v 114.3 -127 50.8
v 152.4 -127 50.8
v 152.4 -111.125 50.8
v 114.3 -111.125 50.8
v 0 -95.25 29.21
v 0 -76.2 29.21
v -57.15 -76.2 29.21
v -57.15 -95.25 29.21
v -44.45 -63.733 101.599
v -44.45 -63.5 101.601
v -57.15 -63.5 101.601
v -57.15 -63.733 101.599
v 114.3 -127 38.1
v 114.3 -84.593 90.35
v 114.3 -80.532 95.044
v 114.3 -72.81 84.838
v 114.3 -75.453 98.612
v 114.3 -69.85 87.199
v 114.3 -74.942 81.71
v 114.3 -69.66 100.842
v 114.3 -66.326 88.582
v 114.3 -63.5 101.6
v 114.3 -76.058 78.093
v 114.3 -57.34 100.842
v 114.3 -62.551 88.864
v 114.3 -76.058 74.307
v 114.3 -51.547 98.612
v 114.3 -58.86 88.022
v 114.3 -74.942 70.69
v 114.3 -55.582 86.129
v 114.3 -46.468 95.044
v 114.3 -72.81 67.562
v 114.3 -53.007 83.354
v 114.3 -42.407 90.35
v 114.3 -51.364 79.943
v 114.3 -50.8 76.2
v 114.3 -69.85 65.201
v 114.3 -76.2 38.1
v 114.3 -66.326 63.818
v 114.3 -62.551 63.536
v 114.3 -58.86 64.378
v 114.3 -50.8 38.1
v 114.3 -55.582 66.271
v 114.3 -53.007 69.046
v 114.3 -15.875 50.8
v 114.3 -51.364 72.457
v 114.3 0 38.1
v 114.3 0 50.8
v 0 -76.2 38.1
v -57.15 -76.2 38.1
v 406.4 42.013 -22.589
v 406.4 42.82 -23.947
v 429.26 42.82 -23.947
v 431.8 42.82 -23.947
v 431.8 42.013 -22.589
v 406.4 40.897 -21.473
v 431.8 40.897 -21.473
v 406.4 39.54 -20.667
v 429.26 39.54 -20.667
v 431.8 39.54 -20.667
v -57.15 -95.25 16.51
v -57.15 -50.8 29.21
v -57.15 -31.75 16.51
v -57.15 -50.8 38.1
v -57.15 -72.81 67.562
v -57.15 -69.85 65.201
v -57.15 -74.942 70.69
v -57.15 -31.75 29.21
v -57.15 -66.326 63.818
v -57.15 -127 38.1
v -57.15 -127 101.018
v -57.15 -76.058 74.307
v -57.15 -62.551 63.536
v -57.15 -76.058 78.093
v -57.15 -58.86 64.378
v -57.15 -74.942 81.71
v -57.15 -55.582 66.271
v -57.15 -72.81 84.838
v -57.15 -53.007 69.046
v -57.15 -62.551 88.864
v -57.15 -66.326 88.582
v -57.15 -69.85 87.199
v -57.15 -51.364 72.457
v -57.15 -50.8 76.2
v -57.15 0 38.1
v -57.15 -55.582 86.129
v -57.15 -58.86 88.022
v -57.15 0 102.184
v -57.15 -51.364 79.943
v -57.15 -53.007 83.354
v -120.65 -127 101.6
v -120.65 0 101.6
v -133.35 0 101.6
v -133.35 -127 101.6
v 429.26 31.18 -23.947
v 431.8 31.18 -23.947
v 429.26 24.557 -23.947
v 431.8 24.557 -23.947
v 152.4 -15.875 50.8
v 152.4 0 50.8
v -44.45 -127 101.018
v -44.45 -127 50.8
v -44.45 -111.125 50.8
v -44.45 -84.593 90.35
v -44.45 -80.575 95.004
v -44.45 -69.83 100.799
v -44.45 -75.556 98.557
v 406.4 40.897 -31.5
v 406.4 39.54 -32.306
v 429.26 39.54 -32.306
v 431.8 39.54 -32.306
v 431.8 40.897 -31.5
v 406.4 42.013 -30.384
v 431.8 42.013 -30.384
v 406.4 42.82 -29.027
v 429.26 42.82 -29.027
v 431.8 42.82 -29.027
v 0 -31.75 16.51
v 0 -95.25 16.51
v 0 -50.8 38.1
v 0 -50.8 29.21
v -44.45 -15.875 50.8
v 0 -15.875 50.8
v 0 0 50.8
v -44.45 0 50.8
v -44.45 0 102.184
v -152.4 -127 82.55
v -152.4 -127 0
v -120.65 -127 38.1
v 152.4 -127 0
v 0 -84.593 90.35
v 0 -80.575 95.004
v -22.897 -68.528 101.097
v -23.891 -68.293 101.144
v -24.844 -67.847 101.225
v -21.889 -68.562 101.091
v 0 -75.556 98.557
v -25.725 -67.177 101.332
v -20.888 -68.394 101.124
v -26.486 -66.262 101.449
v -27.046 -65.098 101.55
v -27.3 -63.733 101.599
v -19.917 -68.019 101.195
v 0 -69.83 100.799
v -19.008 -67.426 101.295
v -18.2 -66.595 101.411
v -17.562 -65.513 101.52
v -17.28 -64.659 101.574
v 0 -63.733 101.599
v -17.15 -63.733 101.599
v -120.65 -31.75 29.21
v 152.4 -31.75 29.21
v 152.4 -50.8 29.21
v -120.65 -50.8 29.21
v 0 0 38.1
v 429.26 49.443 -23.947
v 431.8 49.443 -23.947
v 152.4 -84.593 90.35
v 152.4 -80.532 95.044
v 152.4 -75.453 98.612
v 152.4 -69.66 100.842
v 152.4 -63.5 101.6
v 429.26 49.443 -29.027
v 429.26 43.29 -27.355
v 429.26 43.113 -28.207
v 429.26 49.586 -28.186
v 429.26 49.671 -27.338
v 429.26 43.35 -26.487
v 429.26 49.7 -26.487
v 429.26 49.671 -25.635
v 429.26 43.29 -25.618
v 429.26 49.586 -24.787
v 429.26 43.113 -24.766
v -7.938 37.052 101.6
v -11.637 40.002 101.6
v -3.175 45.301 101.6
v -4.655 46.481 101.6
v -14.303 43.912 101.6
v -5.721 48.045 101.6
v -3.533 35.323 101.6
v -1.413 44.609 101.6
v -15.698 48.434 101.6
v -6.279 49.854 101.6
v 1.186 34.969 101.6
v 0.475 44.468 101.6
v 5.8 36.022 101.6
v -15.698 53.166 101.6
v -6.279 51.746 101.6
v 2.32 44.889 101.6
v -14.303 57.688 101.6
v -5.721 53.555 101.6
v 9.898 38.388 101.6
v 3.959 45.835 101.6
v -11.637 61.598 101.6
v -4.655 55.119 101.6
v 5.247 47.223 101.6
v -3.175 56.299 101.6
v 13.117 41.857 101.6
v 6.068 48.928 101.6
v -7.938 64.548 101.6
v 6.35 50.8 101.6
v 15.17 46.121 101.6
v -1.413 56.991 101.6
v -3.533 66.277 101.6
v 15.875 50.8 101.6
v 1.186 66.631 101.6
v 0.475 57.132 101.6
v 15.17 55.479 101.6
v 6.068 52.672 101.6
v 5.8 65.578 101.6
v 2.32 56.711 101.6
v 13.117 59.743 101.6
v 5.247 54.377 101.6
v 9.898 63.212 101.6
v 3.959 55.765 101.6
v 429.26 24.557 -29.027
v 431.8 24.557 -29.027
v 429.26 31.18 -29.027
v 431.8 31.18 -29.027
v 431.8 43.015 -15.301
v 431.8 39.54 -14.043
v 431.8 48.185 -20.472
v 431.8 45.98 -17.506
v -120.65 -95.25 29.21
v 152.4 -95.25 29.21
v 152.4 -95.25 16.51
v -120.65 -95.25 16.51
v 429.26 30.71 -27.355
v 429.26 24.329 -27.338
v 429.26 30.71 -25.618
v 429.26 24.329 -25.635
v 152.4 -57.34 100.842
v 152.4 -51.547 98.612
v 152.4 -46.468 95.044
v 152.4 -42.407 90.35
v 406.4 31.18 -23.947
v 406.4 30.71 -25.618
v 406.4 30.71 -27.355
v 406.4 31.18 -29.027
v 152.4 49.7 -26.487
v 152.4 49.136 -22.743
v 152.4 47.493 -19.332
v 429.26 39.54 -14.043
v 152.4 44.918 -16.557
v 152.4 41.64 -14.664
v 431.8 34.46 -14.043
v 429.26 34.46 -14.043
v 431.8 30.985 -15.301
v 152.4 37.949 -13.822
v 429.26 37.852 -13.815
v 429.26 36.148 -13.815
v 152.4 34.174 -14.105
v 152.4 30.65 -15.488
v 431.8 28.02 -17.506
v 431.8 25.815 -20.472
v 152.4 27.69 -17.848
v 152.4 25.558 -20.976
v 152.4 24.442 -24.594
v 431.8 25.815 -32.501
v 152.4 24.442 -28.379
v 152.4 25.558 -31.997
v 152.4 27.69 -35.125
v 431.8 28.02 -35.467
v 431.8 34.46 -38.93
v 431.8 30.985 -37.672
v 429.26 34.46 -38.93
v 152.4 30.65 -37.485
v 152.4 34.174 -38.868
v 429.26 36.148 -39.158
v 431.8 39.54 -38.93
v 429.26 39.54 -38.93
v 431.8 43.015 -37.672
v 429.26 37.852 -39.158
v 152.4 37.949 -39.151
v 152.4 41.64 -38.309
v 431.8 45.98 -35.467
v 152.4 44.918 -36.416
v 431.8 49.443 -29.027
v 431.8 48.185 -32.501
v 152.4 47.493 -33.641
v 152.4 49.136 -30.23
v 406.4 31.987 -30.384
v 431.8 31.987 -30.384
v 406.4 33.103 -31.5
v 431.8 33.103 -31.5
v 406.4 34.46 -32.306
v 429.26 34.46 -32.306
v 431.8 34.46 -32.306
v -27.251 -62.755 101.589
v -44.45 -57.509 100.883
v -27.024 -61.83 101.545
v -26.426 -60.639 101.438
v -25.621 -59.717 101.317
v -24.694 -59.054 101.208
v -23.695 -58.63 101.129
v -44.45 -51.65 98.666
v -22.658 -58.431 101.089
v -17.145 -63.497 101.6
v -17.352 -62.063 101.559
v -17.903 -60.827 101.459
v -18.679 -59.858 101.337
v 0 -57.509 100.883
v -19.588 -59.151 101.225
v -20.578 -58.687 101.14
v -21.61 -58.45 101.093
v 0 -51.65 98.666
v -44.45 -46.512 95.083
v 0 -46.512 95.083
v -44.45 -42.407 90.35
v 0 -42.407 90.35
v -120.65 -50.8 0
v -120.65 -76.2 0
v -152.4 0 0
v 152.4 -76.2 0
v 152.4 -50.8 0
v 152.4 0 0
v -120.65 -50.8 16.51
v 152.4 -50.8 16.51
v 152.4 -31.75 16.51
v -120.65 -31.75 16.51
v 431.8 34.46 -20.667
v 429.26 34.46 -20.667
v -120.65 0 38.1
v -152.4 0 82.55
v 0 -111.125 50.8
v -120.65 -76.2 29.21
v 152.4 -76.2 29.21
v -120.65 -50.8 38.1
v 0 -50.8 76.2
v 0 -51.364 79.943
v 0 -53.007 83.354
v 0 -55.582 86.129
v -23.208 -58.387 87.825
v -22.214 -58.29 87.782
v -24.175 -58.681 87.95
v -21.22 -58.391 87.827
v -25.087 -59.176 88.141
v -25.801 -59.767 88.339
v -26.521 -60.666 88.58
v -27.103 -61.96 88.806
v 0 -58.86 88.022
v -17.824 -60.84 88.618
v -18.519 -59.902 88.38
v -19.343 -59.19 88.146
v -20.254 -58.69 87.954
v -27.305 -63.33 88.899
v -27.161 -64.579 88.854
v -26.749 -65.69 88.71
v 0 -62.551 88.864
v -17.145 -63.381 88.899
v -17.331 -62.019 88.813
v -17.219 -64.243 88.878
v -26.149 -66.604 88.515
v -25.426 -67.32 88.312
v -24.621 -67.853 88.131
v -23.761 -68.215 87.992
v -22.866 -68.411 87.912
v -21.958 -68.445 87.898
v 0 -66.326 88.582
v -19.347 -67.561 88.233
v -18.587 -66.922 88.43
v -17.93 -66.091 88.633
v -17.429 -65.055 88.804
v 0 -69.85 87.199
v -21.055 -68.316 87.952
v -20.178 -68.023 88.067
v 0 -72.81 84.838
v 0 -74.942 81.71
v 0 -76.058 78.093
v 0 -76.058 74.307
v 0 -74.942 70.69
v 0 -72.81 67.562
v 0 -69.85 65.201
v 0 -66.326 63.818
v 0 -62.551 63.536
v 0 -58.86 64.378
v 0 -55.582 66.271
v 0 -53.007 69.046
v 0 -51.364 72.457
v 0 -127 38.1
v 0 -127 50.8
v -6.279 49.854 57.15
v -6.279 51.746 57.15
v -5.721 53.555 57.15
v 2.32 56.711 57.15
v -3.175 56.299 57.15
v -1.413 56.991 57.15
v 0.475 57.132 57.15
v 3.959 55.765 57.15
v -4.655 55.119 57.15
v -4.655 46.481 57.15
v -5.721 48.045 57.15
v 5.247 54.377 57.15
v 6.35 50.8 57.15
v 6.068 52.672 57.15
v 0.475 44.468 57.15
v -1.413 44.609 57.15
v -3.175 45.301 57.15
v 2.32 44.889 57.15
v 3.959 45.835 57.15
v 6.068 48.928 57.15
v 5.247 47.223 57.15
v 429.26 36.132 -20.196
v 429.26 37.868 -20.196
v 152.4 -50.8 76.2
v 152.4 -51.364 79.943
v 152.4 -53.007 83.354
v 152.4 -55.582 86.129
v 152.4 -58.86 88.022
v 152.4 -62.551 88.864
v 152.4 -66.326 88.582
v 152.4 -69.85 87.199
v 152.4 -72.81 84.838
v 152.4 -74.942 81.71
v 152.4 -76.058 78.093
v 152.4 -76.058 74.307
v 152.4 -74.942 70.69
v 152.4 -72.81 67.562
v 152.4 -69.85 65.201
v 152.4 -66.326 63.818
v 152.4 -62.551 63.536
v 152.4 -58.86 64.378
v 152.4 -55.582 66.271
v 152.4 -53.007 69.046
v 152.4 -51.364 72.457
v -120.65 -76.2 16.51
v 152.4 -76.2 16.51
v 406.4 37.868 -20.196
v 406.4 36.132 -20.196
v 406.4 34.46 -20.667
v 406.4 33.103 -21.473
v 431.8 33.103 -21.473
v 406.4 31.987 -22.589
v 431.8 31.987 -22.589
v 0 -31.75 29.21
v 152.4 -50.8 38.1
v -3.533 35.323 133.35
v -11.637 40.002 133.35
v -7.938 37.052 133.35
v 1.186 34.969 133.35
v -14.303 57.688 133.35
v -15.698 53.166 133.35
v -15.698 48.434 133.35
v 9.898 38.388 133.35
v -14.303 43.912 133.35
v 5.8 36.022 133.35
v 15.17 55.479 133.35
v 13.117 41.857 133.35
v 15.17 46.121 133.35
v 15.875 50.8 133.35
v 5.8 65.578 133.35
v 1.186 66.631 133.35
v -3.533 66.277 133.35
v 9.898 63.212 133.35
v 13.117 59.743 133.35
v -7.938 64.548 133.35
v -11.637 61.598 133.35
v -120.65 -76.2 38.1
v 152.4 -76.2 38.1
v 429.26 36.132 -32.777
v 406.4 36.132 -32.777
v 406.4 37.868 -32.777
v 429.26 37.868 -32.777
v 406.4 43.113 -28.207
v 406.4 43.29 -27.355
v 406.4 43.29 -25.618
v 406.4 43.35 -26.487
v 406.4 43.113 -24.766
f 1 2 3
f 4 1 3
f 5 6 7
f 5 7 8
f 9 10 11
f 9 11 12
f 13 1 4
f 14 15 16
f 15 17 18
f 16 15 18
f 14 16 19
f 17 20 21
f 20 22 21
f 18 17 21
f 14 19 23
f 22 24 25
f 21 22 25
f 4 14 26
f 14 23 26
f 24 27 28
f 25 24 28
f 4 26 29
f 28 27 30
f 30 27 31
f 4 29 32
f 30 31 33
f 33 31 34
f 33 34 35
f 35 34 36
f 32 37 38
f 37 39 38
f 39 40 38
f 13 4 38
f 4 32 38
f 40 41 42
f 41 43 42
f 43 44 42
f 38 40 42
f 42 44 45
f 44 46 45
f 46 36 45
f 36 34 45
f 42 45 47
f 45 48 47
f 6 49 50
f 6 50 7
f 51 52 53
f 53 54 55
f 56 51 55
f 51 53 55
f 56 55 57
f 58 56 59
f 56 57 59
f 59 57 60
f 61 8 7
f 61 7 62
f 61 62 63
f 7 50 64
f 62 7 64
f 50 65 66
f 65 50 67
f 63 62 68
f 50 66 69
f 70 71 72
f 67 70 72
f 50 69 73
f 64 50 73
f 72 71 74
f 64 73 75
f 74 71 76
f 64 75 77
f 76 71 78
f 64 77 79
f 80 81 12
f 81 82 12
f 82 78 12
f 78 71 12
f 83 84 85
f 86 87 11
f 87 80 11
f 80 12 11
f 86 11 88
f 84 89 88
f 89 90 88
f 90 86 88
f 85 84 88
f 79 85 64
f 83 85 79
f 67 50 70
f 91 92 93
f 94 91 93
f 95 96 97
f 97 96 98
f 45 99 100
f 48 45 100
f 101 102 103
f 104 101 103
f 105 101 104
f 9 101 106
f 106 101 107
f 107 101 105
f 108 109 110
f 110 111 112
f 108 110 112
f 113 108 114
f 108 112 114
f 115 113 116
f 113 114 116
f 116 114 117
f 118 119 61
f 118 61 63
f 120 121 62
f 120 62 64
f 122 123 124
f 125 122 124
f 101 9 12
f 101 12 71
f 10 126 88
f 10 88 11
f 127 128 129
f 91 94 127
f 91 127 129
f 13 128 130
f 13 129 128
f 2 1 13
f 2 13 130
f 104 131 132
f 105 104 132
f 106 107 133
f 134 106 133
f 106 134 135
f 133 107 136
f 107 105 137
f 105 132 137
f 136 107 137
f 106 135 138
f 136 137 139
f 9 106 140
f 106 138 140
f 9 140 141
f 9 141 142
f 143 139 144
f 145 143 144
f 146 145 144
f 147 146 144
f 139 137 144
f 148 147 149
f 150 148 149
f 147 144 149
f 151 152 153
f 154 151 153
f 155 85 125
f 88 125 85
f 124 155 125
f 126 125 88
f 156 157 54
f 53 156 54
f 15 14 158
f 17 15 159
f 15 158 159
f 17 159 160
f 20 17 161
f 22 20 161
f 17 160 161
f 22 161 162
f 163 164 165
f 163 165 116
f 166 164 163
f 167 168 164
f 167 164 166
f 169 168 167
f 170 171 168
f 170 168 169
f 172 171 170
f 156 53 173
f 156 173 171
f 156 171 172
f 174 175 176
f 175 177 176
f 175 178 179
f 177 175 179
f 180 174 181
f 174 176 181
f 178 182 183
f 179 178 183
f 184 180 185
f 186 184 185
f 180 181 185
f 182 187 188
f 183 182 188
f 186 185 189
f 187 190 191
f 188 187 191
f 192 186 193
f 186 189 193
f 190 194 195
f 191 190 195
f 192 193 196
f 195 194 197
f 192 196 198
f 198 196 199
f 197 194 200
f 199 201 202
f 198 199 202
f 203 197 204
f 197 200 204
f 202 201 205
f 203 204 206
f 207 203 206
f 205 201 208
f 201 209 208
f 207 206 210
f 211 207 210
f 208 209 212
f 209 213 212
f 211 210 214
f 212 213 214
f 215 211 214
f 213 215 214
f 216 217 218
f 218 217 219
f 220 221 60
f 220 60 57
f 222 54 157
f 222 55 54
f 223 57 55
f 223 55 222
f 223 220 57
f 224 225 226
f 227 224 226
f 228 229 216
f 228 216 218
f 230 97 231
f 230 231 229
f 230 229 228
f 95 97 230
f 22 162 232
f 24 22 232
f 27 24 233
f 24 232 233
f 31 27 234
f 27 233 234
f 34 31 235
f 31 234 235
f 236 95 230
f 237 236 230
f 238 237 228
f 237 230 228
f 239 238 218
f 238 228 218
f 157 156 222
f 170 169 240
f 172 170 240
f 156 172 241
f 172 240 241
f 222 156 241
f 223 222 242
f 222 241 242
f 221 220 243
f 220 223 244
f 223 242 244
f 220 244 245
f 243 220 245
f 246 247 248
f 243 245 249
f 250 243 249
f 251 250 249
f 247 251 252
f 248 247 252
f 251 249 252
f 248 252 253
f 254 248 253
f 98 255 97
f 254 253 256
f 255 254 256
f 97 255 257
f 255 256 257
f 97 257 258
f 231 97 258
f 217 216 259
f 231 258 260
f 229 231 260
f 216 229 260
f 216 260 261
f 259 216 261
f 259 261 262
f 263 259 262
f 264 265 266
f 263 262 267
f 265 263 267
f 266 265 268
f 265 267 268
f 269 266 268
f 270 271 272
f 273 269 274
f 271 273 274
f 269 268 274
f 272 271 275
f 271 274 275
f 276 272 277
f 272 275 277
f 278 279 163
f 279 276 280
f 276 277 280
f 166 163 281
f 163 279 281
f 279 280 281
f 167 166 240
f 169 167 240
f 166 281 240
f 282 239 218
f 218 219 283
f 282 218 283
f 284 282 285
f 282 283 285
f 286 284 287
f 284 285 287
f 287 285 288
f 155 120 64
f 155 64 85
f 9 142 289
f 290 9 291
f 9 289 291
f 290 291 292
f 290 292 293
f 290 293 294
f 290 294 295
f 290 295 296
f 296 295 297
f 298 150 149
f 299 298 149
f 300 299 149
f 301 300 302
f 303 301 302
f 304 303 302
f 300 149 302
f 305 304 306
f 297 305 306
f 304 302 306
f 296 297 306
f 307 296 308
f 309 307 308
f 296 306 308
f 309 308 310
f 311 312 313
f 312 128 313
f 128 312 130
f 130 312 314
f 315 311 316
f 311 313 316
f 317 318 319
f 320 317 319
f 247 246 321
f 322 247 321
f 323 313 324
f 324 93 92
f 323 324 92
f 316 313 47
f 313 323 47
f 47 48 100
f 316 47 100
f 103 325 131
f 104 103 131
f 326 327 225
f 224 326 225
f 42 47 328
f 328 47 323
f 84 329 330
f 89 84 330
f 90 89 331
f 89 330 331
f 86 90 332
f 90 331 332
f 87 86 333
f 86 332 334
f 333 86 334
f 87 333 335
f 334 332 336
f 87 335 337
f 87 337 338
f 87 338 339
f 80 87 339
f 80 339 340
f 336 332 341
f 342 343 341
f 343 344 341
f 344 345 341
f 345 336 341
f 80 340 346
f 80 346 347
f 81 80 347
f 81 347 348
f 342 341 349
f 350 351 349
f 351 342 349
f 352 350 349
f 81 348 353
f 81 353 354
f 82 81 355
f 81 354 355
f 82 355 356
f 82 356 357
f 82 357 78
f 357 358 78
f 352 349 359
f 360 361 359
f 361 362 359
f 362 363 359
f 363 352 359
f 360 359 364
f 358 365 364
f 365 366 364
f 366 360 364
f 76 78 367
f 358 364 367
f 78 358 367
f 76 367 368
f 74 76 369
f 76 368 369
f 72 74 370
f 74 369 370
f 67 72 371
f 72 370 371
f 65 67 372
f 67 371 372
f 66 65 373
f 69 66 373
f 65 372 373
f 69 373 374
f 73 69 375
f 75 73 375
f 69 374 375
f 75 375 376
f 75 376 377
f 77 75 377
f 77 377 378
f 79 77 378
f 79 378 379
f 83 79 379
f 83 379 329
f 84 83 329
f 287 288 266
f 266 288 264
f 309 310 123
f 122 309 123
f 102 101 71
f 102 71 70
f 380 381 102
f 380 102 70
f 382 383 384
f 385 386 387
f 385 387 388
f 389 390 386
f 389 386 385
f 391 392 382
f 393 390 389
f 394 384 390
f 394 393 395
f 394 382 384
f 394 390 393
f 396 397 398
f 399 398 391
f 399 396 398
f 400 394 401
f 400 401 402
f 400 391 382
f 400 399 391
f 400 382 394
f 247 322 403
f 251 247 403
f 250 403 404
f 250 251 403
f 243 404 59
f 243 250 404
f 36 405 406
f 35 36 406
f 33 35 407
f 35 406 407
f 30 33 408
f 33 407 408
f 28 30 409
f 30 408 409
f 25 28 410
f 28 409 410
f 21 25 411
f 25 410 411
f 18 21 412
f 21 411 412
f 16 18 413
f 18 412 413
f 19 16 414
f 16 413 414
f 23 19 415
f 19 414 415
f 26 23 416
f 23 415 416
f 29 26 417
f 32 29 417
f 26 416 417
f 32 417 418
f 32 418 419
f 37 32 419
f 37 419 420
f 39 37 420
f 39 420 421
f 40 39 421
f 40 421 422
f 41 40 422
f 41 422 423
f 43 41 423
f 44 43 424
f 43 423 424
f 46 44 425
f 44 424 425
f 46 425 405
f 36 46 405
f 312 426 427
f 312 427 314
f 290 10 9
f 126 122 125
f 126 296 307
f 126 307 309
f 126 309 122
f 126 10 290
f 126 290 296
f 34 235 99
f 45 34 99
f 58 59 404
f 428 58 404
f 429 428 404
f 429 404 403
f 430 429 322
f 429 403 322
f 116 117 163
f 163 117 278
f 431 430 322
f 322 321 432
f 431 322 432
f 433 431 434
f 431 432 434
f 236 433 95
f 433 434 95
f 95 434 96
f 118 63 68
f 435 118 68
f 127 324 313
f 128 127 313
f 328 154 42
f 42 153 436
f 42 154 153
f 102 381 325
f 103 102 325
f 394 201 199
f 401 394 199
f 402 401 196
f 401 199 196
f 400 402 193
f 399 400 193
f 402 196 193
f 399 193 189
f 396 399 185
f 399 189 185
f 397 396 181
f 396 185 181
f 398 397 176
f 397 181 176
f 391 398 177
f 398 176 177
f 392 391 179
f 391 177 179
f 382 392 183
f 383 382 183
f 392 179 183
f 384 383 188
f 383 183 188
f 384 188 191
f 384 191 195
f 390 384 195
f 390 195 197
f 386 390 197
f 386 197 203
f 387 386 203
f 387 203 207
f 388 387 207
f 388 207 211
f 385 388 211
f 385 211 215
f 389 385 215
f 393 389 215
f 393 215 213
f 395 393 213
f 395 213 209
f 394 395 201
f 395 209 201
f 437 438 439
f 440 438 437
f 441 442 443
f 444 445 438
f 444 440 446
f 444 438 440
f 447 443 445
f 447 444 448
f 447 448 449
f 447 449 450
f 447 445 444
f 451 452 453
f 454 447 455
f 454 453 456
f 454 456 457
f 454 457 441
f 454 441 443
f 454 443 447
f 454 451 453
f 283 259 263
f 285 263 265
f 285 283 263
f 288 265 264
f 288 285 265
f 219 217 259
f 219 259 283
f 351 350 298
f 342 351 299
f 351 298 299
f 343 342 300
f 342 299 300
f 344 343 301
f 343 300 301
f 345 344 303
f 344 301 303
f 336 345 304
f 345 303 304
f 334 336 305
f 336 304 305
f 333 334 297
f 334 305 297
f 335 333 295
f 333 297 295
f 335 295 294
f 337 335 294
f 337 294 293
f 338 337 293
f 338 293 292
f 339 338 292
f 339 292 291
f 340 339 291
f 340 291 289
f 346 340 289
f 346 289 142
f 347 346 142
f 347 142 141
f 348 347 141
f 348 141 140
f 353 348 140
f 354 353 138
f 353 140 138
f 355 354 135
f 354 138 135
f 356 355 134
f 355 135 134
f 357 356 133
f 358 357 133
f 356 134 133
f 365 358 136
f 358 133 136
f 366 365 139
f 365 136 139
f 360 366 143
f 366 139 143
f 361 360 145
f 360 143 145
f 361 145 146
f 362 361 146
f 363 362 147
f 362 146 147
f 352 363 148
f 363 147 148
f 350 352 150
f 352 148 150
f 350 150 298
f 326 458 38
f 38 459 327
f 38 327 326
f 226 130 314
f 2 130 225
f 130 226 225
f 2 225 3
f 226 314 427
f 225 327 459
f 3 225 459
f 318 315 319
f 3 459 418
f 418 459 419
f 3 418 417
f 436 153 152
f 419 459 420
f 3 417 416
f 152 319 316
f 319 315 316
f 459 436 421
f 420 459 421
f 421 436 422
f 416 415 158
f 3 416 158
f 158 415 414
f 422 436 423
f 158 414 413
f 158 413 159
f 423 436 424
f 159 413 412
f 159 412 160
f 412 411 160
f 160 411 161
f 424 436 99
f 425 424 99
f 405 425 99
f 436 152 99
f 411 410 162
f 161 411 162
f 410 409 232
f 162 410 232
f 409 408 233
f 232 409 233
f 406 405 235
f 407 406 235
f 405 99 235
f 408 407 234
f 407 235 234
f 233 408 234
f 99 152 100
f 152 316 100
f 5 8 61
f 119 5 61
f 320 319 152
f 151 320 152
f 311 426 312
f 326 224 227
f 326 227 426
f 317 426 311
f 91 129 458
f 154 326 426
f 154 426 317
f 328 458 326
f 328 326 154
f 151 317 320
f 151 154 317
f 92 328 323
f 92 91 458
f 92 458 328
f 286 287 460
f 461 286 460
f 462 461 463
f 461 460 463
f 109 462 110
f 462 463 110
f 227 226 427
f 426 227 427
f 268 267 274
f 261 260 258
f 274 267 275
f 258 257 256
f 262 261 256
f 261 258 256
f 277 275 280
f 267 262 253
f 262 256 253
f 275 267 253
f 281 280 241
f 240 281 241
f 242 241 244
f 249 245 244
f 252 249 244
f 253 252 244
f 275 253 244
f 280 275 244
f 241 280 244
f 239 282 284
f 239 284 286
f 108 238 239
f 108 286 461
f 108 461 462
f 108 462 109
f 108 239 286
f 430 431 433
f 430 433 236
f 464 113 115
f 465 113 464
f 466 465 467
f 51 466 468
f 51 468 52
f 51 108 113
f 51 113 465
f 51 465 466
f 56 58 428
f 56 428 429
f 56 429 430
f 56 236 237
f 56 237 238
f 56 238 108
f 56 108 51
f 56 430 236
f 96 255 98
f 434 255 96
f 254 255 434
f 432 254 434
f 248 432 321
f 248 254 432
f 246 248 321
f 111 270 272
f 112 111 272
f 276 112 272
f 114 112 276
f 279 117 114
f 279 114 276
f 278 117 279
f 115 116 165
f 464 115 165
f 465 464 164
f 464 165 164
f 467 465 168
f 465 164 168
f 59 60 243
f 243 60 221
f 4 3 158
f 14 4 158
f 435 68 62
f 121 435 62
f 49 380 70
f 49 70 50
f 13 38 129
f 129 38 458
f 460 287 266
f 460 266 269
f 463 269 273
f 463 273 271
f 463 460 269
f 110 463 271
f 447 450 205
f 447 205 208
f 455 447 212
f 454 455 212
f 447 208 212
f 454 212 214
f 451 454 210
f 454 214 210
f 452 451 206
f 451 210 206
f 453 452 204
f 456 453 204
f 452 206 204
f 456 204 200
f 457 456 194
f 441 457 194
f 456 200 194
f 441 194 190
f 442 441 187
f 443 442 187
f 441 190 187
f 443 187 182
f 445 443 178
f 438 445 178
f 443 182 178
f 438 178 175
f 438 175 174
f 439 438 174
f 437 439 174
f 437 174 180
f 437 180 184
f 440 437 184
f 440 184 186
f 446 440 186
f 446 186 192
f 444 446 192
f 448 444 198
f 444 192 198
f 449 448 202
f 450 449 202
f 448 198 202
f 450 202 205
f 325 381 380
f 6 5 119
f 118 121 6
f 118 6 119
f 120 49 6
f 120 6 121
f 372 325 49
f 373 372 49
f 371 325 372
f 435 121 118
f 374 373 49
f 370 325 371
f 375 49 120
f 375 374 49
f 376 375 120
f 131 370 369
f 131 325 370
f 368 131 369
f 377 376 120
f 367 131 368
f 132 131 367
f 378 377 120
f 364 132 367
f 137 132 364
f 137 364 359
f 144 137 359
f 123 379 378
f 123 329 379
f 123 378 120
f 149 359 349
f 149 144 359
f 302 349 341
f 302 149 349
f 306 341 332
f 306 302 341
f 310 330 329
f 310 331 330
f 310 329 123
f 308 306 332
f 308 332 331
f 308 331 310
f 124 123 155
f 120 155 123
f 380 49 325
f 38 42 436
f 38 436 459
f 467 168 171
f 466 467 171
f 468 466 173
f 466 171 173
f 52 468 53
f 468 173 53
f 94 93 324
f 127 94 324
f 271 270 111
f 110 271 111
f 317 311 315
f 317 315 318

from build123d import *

# Parameters (mm, degrees)
F1_DEPTH  = 127
F3_DEPTH  = 273.05
F2_R      = 12.7
F4_DEPTH  = 38.1
F5_R      = 12.7
F6_DEPTH  = 57.15
F7_DEPTH  = 44.45
F8_R      = 5.08
F9_DEPTH  = 25.4
F10_R     = 12.7
F11_DEPTH = 279.4
F13_DEPTH = 25.4
F14_DEPTH = 2.54
F15_R     = 15.875
F16_DEPTH = 31.75
F17_R     = 6.35
F18_DEPTH = 44.45


with BuildPart() as f1:
    # F0 (on Front) → F1 (new body)
    with BuildSketch(Plane.XZ):
        Polygon((-152.4, 82.55), (-152.4, 0), (152.4, 0), (152.4, 101.6), (114.3, 101.6), (114.3, 38.1), (-120.65, 38.1), (-120.65, 101.6), (-133.35, 101.6), align=None)
    extrude(amount=F1_DEPTH)

    # F2 (on face) → F3 (cut, through all)
    with BuildSketch(Plane.YZ.offset(152.4)):
        Polygon((-76.2, 16.51), (-76.2, 0), (-50.8, 0), (-50.8, 16.51), (-31.75, 16.51), (-31.75, 29.21), (-50.8, 29.21), (-50.8, 38.1), (-76.2, 38.1), (-76.2, 29.21), (-95.25, 29.21), (-95.25, 16.51), align=None)
    extrude(amount=-F3_DEPTH, mode=Mode.SUBTRACT)

    # F2 (on face) → F4 (cut, through all)
    with BuildSketch(Plane.YZ.offset(152.4)):
        with BuildLine():
            Line((-127, 101.6), (-127, 50.8))
            Line((-127, 50.8), (-111.125, 50.8))
            Line((-111.125, 50.8), (-84.5934256055, 90.3501730104))
            ThreePointArc((-84.5934256055, 90.3501730104), (-75.4529411765, 98.6117647059), (-63.5, 101.6))
            Line((-63.5, 101.6), (-127, 101.6))
        make_face()
        with BuildLine():
            Line((0, 101.6), (-63.5, 101.6))
            ThreePointArc((-63.5, 101.6), (-51.5470588235, 98.6117647059), (-42.4065743945, 90.3501730104))
            Line((-42.4065743945, 90.3501730104), (-15.875, 50.8))
            Line((-15.875, 50.8), (0, 50.8))
            Line((0, 50.8), (0, 101.6))
        make_face()
        with Locations((-63.5, 76.2)):
            Circle(F2_R)
    extrude(amount=-F4_DEPTH, mode=Mode.SUBTRACT)


with BuildPart() as f6:
    # F5 (on Right) → F6 (new body)
    with BuildSketch(Plane.YZ):
        with BuildLine():
            Line((-95.25, 29.21), (-95.25, 16.51))
            Line((-95.25, 16.51), (-31.75, 16.51))
            Line((-31.75, 16.51), (-31.75, 29.21))
            Line((-31.75, 29.21), (-50.8, 29.21))
            Line((-50.8, 29.21), (-50.8, 38.1))
            Line((-50.8, 38.1), (0, 38.1))
            Line((0, 38.1), (0, 50.8))
            Line((0, 50.8), (-15.875, 50.8))
            Line((-15.875, 50.8), (-42.4065743945, 90.3501730104))
            ThreePointArc((-42.4065743945, 90.3501730104), (-51.6500867545, 98.6664095056), (-63.7332419371, 101.5989290758))
            ThreePointArc((-63.7332419371, 101.5989290758), (-75.555717124, 98.5566474371), (-84.5934256055, 90.3501730104))
            Line((-84.5934256055, 90.3501730104), (-111.125, 50.8))
            Line((-111.125, 50.8), (-127, 50.8))
            Line((-127, 50.8), (-127, 38.1))
            Line((-127, 38.1), (-76.2, 38.1))
            Line((-76.2, 38.1), (-76.2, 29.21))
            Line((-76.2, 29.21), (-95.25, 29.21))
        make_face()
        with Locations((-63.5, 76.2)):
            Circle(F5_R, mode=Mode.SUBTRACT)
        with BuildLine():
            Line((-127, 101.0179419357), (-127, 50.8))
            Line((-127, 50.8), (-111.125, 50.8))
            Line((-111.125, 50.8), (-84.5934256055, 90.3501730104))
            ThreePointArc((-84.5934256055, 90.3501730104), (-75.555717124, 98.5566474371), (-63.7332419371, 101.5989290758))
            Line((-63.7332419371, 101.5989290758), (-127, 101.0179419357))
        make_face()
        with BuildLine():
            Line((-15.875, 50.8), (0, 50.8))
            Line((0, 50.8), (0, 102.1842))
            Line((0, 102.1842), (-63.5, 101.6010709679))
            Line((-63.5, 101.6010709679), (-63.7332419371, 101.5989290758))
            ThreePointArc((-63.7332419371, 101.5989290758), (-51.6500867545, 98.6664095056), (-42.4065743945, 90.3501730104))
            Line((-42.4065743945, 90.3501730104), (-15.875, 50.8))
        make_face()
    extrude(amount=-F6_DEPTH)

    # F5 (on Right) → F7 (cut)
    with BuildSketch(Plane.YZ):
        with BuildLine():
            Line((-127, 101.0179419357), (-127, 50.8))
            Line((-127, 50.8), (-111.125, 50.8))
            Line((-111.125, 50.8), (-84.5934256055, 90.3501730104))
            ThreePointArc((-84.5934256055, 90.3501730104), (-75.555717124, 98.5566474371), (-63.7332419371, 101.5989290758))
            Line((-63.7332419371, 101.5989290758), (-127, 101.0179419357))
        make_face()
        with BuildLine():
            Line((-15.875, 50.8), (0, 50.8))
            Line((0, 50.8), (0, 102.1842))
            Line((0, 102.1842), (-63.5, 101.6010709679))
            Line((-63.5, 101.6010709679), (-63.7332419371, 101.5989290758))
            ThreePointArc((-63.7332419371, 101.5989290758), (-51.6500867545, 98.6664095056), (-42.4065743945, 90.3501730104))
            Line((-42.4065743945, 90.3501730104), (-15.875, 50.8))
        make_face()
    extrude(amount=-F7_DEPTH, mode=Mode.SUBTRACT)

    # F8 (on face) → F9 (cut)
    with BuildSketch(Plane(origin=(0, -0.9382921124, 102.1755835375), x_dir=(1, 0, 0), z_dir=(0, -0.0091827472, 0.9999578377))):
        with Locations((-22.225, -62.5616683254)):
            Circle(F8_R)
    extrude(amount=-F9_DEPTH, mode=Mode.SUBTRACT)


with BuildPart() as f11:
    # F10 (on face) → F11 (new body)
    with BuildSketch(Plane.YZ.offset(152.4)):
        with Locations((37.0000302792, -26.4865104109)):
            Circle(F10_R)
    extrude(amount=F11_DEPTH)

    # F12 (on face) → F13 (cut)
    with BuildSketch(Plane.YZ.offset(431.8)):
        with BuildLine():
            ThreePointArc((42.8199014118, -29.0265104109), (43.2160853663, -27.7838766483), (43.3500302792, -26.4865104109))
            ThreePointArc((43.3500302792, -26.4865104109), (43.2160853663, -25.1891441735), (42.8199014118, -23.9465104109))
            ThreePointArc((42.8199014118, -23.9465104109), (41.4901583397, -21.9963823504), (39.5400302792, -20.6666392783))
            ThreePointArc((39.5400302792, -20.6666392783), (37.0000302792, -20.1365104109), (34.4600302792, -20.6666392783))
            ThreePointArc((34.4600302792, -20.6666392783), (32.5099022186, -21.9963823504), (31.1801591466, -23.9465104109))
            ThreePointArc((31.1801591466, -23.9465104109), (30.6500302792, -26.4865104109), (31.1801591466, -29.0265104109))
            ThreePointArc((31.1801591466, -29.0265104109), (32.5099022186, -30.9766384714), (34.4600302792, -32.3063815435))
            ThreePointArc((34.4600302792, -32.3063815435), (37.0000302792, -32.8365104109), (39.5400302792, -32.3063815435))
            ThreePointArc((39.5400302792, -32.3063815435), (41.4901583397, -30.9766384714), (42.8199014118, -29.0265104109))
        make_face()
    extrude(amount=-F13_DEPTH, mode=Mode.SUBTRACT)

    # F12 (on face) → F14 (cut)
    with BuildSketch(Plane.YZ.offset(431.8)):
        with BuildLine():
            ThreePointArc((31.1801591466, -29.0265104109), (30.6500302792, -26.4865104109), (31.1801591466, -23.9465104109))
            Line((31.1801591466, -23.9465104109), (24.5566223858, -23.9465104109))
            ThreePointArc((24.5566223858, -23.9465104109), (24.3000302792, -26.4865104109), (24.5566223858, -29.0265104109))
            Line((24.5566223858, -29.0265104109), (31.1801591466, -29.0265104109))
        make_face()
        with BuildLine():
            ThreePointArc((34.4600302792, -20.6666392783), (37.0000302792, -20.1365104109), (39.5400302792, -20.6666392783))
            Line((39.5400302792, -20.6666392783), (39.5400302792, -14.0431025176))
            ThreePointArc((39.5400302792, -14.0431025176), (37.0000302792, -13.7865104109), (34.4600302792, -14.0431025176))
            Line((34.4600302792, -14.0431025176), (34.4600302792, -20.6666392783))
        make_face()
        with BuildLine():
            ThreePointArc((42.8199014118, -23.9465104109), (43.2160853663, -25.1891441735), (43.3500302792, -26.4865104109))
            ThreePointArc((43.3500302792, -26.4865104109), (43.2160853663, -27.7838766483), (42.8199014118, -29.0265104109))
            Line((42.8199014118, -29.0265104109), (49.4434381725, -29.0265104109))
            ThreePointArc((49.4434381725, -29.0265104109), (49.6357194223, -27.7629742284), (49.7000302792, -26.4865104109))
            ThreePointArc((49.7000302792, -26.4865104109), (49.6357194223, -25.2100465934), (49.4434381725, -23.9465104109))
            Line((49.4434381725, -23.9465104109), (42.8199014118, -23.9465104109))
        make_face()
        with BuildLine():
            Line((39.5400302792, -38.9299183042), (39.5400302792, -32.3063815435))
            ThreePointArc((39.5400302792, -32.3063815435), (37.0000302792, -32.8365104109), (34.4600302792, -32.3063815435))
            Line((34.4600302792, -32.3063815435), (34.4600302792, -38.9299183042))
            ThreePointArc((34.4600302792, -38.9299183042), (37.0000302792, -39.1865104109), (39.5400302792, -38.9299183042))
        make_face()
    extrude(amount=-F14_DEPTH, mode=Mode.SUBTRACT)


with BuildPart() as f16:
    # F15 (on face) → F16 (new body)
    with BuildSketch(Plane.XY.offset(101.6)):
        with Locations((0, 50.8)):
            Circle(F15_R)
    extrude(amount=F16_DEPTH)

    # F17 (on face) → F18 (join)
    with BuildSketch(Plane(origin=(0, 0, 101.6), x_dir=(1, 0, 0), z_dir=(0, 0, -1))):
        with Locations((0, -50.8)):
            Circle(F17_R)
    extrude(amount=F18_DEPTH)


solid = Compound([f1.part, f6.part, f11.part, f16.part])
